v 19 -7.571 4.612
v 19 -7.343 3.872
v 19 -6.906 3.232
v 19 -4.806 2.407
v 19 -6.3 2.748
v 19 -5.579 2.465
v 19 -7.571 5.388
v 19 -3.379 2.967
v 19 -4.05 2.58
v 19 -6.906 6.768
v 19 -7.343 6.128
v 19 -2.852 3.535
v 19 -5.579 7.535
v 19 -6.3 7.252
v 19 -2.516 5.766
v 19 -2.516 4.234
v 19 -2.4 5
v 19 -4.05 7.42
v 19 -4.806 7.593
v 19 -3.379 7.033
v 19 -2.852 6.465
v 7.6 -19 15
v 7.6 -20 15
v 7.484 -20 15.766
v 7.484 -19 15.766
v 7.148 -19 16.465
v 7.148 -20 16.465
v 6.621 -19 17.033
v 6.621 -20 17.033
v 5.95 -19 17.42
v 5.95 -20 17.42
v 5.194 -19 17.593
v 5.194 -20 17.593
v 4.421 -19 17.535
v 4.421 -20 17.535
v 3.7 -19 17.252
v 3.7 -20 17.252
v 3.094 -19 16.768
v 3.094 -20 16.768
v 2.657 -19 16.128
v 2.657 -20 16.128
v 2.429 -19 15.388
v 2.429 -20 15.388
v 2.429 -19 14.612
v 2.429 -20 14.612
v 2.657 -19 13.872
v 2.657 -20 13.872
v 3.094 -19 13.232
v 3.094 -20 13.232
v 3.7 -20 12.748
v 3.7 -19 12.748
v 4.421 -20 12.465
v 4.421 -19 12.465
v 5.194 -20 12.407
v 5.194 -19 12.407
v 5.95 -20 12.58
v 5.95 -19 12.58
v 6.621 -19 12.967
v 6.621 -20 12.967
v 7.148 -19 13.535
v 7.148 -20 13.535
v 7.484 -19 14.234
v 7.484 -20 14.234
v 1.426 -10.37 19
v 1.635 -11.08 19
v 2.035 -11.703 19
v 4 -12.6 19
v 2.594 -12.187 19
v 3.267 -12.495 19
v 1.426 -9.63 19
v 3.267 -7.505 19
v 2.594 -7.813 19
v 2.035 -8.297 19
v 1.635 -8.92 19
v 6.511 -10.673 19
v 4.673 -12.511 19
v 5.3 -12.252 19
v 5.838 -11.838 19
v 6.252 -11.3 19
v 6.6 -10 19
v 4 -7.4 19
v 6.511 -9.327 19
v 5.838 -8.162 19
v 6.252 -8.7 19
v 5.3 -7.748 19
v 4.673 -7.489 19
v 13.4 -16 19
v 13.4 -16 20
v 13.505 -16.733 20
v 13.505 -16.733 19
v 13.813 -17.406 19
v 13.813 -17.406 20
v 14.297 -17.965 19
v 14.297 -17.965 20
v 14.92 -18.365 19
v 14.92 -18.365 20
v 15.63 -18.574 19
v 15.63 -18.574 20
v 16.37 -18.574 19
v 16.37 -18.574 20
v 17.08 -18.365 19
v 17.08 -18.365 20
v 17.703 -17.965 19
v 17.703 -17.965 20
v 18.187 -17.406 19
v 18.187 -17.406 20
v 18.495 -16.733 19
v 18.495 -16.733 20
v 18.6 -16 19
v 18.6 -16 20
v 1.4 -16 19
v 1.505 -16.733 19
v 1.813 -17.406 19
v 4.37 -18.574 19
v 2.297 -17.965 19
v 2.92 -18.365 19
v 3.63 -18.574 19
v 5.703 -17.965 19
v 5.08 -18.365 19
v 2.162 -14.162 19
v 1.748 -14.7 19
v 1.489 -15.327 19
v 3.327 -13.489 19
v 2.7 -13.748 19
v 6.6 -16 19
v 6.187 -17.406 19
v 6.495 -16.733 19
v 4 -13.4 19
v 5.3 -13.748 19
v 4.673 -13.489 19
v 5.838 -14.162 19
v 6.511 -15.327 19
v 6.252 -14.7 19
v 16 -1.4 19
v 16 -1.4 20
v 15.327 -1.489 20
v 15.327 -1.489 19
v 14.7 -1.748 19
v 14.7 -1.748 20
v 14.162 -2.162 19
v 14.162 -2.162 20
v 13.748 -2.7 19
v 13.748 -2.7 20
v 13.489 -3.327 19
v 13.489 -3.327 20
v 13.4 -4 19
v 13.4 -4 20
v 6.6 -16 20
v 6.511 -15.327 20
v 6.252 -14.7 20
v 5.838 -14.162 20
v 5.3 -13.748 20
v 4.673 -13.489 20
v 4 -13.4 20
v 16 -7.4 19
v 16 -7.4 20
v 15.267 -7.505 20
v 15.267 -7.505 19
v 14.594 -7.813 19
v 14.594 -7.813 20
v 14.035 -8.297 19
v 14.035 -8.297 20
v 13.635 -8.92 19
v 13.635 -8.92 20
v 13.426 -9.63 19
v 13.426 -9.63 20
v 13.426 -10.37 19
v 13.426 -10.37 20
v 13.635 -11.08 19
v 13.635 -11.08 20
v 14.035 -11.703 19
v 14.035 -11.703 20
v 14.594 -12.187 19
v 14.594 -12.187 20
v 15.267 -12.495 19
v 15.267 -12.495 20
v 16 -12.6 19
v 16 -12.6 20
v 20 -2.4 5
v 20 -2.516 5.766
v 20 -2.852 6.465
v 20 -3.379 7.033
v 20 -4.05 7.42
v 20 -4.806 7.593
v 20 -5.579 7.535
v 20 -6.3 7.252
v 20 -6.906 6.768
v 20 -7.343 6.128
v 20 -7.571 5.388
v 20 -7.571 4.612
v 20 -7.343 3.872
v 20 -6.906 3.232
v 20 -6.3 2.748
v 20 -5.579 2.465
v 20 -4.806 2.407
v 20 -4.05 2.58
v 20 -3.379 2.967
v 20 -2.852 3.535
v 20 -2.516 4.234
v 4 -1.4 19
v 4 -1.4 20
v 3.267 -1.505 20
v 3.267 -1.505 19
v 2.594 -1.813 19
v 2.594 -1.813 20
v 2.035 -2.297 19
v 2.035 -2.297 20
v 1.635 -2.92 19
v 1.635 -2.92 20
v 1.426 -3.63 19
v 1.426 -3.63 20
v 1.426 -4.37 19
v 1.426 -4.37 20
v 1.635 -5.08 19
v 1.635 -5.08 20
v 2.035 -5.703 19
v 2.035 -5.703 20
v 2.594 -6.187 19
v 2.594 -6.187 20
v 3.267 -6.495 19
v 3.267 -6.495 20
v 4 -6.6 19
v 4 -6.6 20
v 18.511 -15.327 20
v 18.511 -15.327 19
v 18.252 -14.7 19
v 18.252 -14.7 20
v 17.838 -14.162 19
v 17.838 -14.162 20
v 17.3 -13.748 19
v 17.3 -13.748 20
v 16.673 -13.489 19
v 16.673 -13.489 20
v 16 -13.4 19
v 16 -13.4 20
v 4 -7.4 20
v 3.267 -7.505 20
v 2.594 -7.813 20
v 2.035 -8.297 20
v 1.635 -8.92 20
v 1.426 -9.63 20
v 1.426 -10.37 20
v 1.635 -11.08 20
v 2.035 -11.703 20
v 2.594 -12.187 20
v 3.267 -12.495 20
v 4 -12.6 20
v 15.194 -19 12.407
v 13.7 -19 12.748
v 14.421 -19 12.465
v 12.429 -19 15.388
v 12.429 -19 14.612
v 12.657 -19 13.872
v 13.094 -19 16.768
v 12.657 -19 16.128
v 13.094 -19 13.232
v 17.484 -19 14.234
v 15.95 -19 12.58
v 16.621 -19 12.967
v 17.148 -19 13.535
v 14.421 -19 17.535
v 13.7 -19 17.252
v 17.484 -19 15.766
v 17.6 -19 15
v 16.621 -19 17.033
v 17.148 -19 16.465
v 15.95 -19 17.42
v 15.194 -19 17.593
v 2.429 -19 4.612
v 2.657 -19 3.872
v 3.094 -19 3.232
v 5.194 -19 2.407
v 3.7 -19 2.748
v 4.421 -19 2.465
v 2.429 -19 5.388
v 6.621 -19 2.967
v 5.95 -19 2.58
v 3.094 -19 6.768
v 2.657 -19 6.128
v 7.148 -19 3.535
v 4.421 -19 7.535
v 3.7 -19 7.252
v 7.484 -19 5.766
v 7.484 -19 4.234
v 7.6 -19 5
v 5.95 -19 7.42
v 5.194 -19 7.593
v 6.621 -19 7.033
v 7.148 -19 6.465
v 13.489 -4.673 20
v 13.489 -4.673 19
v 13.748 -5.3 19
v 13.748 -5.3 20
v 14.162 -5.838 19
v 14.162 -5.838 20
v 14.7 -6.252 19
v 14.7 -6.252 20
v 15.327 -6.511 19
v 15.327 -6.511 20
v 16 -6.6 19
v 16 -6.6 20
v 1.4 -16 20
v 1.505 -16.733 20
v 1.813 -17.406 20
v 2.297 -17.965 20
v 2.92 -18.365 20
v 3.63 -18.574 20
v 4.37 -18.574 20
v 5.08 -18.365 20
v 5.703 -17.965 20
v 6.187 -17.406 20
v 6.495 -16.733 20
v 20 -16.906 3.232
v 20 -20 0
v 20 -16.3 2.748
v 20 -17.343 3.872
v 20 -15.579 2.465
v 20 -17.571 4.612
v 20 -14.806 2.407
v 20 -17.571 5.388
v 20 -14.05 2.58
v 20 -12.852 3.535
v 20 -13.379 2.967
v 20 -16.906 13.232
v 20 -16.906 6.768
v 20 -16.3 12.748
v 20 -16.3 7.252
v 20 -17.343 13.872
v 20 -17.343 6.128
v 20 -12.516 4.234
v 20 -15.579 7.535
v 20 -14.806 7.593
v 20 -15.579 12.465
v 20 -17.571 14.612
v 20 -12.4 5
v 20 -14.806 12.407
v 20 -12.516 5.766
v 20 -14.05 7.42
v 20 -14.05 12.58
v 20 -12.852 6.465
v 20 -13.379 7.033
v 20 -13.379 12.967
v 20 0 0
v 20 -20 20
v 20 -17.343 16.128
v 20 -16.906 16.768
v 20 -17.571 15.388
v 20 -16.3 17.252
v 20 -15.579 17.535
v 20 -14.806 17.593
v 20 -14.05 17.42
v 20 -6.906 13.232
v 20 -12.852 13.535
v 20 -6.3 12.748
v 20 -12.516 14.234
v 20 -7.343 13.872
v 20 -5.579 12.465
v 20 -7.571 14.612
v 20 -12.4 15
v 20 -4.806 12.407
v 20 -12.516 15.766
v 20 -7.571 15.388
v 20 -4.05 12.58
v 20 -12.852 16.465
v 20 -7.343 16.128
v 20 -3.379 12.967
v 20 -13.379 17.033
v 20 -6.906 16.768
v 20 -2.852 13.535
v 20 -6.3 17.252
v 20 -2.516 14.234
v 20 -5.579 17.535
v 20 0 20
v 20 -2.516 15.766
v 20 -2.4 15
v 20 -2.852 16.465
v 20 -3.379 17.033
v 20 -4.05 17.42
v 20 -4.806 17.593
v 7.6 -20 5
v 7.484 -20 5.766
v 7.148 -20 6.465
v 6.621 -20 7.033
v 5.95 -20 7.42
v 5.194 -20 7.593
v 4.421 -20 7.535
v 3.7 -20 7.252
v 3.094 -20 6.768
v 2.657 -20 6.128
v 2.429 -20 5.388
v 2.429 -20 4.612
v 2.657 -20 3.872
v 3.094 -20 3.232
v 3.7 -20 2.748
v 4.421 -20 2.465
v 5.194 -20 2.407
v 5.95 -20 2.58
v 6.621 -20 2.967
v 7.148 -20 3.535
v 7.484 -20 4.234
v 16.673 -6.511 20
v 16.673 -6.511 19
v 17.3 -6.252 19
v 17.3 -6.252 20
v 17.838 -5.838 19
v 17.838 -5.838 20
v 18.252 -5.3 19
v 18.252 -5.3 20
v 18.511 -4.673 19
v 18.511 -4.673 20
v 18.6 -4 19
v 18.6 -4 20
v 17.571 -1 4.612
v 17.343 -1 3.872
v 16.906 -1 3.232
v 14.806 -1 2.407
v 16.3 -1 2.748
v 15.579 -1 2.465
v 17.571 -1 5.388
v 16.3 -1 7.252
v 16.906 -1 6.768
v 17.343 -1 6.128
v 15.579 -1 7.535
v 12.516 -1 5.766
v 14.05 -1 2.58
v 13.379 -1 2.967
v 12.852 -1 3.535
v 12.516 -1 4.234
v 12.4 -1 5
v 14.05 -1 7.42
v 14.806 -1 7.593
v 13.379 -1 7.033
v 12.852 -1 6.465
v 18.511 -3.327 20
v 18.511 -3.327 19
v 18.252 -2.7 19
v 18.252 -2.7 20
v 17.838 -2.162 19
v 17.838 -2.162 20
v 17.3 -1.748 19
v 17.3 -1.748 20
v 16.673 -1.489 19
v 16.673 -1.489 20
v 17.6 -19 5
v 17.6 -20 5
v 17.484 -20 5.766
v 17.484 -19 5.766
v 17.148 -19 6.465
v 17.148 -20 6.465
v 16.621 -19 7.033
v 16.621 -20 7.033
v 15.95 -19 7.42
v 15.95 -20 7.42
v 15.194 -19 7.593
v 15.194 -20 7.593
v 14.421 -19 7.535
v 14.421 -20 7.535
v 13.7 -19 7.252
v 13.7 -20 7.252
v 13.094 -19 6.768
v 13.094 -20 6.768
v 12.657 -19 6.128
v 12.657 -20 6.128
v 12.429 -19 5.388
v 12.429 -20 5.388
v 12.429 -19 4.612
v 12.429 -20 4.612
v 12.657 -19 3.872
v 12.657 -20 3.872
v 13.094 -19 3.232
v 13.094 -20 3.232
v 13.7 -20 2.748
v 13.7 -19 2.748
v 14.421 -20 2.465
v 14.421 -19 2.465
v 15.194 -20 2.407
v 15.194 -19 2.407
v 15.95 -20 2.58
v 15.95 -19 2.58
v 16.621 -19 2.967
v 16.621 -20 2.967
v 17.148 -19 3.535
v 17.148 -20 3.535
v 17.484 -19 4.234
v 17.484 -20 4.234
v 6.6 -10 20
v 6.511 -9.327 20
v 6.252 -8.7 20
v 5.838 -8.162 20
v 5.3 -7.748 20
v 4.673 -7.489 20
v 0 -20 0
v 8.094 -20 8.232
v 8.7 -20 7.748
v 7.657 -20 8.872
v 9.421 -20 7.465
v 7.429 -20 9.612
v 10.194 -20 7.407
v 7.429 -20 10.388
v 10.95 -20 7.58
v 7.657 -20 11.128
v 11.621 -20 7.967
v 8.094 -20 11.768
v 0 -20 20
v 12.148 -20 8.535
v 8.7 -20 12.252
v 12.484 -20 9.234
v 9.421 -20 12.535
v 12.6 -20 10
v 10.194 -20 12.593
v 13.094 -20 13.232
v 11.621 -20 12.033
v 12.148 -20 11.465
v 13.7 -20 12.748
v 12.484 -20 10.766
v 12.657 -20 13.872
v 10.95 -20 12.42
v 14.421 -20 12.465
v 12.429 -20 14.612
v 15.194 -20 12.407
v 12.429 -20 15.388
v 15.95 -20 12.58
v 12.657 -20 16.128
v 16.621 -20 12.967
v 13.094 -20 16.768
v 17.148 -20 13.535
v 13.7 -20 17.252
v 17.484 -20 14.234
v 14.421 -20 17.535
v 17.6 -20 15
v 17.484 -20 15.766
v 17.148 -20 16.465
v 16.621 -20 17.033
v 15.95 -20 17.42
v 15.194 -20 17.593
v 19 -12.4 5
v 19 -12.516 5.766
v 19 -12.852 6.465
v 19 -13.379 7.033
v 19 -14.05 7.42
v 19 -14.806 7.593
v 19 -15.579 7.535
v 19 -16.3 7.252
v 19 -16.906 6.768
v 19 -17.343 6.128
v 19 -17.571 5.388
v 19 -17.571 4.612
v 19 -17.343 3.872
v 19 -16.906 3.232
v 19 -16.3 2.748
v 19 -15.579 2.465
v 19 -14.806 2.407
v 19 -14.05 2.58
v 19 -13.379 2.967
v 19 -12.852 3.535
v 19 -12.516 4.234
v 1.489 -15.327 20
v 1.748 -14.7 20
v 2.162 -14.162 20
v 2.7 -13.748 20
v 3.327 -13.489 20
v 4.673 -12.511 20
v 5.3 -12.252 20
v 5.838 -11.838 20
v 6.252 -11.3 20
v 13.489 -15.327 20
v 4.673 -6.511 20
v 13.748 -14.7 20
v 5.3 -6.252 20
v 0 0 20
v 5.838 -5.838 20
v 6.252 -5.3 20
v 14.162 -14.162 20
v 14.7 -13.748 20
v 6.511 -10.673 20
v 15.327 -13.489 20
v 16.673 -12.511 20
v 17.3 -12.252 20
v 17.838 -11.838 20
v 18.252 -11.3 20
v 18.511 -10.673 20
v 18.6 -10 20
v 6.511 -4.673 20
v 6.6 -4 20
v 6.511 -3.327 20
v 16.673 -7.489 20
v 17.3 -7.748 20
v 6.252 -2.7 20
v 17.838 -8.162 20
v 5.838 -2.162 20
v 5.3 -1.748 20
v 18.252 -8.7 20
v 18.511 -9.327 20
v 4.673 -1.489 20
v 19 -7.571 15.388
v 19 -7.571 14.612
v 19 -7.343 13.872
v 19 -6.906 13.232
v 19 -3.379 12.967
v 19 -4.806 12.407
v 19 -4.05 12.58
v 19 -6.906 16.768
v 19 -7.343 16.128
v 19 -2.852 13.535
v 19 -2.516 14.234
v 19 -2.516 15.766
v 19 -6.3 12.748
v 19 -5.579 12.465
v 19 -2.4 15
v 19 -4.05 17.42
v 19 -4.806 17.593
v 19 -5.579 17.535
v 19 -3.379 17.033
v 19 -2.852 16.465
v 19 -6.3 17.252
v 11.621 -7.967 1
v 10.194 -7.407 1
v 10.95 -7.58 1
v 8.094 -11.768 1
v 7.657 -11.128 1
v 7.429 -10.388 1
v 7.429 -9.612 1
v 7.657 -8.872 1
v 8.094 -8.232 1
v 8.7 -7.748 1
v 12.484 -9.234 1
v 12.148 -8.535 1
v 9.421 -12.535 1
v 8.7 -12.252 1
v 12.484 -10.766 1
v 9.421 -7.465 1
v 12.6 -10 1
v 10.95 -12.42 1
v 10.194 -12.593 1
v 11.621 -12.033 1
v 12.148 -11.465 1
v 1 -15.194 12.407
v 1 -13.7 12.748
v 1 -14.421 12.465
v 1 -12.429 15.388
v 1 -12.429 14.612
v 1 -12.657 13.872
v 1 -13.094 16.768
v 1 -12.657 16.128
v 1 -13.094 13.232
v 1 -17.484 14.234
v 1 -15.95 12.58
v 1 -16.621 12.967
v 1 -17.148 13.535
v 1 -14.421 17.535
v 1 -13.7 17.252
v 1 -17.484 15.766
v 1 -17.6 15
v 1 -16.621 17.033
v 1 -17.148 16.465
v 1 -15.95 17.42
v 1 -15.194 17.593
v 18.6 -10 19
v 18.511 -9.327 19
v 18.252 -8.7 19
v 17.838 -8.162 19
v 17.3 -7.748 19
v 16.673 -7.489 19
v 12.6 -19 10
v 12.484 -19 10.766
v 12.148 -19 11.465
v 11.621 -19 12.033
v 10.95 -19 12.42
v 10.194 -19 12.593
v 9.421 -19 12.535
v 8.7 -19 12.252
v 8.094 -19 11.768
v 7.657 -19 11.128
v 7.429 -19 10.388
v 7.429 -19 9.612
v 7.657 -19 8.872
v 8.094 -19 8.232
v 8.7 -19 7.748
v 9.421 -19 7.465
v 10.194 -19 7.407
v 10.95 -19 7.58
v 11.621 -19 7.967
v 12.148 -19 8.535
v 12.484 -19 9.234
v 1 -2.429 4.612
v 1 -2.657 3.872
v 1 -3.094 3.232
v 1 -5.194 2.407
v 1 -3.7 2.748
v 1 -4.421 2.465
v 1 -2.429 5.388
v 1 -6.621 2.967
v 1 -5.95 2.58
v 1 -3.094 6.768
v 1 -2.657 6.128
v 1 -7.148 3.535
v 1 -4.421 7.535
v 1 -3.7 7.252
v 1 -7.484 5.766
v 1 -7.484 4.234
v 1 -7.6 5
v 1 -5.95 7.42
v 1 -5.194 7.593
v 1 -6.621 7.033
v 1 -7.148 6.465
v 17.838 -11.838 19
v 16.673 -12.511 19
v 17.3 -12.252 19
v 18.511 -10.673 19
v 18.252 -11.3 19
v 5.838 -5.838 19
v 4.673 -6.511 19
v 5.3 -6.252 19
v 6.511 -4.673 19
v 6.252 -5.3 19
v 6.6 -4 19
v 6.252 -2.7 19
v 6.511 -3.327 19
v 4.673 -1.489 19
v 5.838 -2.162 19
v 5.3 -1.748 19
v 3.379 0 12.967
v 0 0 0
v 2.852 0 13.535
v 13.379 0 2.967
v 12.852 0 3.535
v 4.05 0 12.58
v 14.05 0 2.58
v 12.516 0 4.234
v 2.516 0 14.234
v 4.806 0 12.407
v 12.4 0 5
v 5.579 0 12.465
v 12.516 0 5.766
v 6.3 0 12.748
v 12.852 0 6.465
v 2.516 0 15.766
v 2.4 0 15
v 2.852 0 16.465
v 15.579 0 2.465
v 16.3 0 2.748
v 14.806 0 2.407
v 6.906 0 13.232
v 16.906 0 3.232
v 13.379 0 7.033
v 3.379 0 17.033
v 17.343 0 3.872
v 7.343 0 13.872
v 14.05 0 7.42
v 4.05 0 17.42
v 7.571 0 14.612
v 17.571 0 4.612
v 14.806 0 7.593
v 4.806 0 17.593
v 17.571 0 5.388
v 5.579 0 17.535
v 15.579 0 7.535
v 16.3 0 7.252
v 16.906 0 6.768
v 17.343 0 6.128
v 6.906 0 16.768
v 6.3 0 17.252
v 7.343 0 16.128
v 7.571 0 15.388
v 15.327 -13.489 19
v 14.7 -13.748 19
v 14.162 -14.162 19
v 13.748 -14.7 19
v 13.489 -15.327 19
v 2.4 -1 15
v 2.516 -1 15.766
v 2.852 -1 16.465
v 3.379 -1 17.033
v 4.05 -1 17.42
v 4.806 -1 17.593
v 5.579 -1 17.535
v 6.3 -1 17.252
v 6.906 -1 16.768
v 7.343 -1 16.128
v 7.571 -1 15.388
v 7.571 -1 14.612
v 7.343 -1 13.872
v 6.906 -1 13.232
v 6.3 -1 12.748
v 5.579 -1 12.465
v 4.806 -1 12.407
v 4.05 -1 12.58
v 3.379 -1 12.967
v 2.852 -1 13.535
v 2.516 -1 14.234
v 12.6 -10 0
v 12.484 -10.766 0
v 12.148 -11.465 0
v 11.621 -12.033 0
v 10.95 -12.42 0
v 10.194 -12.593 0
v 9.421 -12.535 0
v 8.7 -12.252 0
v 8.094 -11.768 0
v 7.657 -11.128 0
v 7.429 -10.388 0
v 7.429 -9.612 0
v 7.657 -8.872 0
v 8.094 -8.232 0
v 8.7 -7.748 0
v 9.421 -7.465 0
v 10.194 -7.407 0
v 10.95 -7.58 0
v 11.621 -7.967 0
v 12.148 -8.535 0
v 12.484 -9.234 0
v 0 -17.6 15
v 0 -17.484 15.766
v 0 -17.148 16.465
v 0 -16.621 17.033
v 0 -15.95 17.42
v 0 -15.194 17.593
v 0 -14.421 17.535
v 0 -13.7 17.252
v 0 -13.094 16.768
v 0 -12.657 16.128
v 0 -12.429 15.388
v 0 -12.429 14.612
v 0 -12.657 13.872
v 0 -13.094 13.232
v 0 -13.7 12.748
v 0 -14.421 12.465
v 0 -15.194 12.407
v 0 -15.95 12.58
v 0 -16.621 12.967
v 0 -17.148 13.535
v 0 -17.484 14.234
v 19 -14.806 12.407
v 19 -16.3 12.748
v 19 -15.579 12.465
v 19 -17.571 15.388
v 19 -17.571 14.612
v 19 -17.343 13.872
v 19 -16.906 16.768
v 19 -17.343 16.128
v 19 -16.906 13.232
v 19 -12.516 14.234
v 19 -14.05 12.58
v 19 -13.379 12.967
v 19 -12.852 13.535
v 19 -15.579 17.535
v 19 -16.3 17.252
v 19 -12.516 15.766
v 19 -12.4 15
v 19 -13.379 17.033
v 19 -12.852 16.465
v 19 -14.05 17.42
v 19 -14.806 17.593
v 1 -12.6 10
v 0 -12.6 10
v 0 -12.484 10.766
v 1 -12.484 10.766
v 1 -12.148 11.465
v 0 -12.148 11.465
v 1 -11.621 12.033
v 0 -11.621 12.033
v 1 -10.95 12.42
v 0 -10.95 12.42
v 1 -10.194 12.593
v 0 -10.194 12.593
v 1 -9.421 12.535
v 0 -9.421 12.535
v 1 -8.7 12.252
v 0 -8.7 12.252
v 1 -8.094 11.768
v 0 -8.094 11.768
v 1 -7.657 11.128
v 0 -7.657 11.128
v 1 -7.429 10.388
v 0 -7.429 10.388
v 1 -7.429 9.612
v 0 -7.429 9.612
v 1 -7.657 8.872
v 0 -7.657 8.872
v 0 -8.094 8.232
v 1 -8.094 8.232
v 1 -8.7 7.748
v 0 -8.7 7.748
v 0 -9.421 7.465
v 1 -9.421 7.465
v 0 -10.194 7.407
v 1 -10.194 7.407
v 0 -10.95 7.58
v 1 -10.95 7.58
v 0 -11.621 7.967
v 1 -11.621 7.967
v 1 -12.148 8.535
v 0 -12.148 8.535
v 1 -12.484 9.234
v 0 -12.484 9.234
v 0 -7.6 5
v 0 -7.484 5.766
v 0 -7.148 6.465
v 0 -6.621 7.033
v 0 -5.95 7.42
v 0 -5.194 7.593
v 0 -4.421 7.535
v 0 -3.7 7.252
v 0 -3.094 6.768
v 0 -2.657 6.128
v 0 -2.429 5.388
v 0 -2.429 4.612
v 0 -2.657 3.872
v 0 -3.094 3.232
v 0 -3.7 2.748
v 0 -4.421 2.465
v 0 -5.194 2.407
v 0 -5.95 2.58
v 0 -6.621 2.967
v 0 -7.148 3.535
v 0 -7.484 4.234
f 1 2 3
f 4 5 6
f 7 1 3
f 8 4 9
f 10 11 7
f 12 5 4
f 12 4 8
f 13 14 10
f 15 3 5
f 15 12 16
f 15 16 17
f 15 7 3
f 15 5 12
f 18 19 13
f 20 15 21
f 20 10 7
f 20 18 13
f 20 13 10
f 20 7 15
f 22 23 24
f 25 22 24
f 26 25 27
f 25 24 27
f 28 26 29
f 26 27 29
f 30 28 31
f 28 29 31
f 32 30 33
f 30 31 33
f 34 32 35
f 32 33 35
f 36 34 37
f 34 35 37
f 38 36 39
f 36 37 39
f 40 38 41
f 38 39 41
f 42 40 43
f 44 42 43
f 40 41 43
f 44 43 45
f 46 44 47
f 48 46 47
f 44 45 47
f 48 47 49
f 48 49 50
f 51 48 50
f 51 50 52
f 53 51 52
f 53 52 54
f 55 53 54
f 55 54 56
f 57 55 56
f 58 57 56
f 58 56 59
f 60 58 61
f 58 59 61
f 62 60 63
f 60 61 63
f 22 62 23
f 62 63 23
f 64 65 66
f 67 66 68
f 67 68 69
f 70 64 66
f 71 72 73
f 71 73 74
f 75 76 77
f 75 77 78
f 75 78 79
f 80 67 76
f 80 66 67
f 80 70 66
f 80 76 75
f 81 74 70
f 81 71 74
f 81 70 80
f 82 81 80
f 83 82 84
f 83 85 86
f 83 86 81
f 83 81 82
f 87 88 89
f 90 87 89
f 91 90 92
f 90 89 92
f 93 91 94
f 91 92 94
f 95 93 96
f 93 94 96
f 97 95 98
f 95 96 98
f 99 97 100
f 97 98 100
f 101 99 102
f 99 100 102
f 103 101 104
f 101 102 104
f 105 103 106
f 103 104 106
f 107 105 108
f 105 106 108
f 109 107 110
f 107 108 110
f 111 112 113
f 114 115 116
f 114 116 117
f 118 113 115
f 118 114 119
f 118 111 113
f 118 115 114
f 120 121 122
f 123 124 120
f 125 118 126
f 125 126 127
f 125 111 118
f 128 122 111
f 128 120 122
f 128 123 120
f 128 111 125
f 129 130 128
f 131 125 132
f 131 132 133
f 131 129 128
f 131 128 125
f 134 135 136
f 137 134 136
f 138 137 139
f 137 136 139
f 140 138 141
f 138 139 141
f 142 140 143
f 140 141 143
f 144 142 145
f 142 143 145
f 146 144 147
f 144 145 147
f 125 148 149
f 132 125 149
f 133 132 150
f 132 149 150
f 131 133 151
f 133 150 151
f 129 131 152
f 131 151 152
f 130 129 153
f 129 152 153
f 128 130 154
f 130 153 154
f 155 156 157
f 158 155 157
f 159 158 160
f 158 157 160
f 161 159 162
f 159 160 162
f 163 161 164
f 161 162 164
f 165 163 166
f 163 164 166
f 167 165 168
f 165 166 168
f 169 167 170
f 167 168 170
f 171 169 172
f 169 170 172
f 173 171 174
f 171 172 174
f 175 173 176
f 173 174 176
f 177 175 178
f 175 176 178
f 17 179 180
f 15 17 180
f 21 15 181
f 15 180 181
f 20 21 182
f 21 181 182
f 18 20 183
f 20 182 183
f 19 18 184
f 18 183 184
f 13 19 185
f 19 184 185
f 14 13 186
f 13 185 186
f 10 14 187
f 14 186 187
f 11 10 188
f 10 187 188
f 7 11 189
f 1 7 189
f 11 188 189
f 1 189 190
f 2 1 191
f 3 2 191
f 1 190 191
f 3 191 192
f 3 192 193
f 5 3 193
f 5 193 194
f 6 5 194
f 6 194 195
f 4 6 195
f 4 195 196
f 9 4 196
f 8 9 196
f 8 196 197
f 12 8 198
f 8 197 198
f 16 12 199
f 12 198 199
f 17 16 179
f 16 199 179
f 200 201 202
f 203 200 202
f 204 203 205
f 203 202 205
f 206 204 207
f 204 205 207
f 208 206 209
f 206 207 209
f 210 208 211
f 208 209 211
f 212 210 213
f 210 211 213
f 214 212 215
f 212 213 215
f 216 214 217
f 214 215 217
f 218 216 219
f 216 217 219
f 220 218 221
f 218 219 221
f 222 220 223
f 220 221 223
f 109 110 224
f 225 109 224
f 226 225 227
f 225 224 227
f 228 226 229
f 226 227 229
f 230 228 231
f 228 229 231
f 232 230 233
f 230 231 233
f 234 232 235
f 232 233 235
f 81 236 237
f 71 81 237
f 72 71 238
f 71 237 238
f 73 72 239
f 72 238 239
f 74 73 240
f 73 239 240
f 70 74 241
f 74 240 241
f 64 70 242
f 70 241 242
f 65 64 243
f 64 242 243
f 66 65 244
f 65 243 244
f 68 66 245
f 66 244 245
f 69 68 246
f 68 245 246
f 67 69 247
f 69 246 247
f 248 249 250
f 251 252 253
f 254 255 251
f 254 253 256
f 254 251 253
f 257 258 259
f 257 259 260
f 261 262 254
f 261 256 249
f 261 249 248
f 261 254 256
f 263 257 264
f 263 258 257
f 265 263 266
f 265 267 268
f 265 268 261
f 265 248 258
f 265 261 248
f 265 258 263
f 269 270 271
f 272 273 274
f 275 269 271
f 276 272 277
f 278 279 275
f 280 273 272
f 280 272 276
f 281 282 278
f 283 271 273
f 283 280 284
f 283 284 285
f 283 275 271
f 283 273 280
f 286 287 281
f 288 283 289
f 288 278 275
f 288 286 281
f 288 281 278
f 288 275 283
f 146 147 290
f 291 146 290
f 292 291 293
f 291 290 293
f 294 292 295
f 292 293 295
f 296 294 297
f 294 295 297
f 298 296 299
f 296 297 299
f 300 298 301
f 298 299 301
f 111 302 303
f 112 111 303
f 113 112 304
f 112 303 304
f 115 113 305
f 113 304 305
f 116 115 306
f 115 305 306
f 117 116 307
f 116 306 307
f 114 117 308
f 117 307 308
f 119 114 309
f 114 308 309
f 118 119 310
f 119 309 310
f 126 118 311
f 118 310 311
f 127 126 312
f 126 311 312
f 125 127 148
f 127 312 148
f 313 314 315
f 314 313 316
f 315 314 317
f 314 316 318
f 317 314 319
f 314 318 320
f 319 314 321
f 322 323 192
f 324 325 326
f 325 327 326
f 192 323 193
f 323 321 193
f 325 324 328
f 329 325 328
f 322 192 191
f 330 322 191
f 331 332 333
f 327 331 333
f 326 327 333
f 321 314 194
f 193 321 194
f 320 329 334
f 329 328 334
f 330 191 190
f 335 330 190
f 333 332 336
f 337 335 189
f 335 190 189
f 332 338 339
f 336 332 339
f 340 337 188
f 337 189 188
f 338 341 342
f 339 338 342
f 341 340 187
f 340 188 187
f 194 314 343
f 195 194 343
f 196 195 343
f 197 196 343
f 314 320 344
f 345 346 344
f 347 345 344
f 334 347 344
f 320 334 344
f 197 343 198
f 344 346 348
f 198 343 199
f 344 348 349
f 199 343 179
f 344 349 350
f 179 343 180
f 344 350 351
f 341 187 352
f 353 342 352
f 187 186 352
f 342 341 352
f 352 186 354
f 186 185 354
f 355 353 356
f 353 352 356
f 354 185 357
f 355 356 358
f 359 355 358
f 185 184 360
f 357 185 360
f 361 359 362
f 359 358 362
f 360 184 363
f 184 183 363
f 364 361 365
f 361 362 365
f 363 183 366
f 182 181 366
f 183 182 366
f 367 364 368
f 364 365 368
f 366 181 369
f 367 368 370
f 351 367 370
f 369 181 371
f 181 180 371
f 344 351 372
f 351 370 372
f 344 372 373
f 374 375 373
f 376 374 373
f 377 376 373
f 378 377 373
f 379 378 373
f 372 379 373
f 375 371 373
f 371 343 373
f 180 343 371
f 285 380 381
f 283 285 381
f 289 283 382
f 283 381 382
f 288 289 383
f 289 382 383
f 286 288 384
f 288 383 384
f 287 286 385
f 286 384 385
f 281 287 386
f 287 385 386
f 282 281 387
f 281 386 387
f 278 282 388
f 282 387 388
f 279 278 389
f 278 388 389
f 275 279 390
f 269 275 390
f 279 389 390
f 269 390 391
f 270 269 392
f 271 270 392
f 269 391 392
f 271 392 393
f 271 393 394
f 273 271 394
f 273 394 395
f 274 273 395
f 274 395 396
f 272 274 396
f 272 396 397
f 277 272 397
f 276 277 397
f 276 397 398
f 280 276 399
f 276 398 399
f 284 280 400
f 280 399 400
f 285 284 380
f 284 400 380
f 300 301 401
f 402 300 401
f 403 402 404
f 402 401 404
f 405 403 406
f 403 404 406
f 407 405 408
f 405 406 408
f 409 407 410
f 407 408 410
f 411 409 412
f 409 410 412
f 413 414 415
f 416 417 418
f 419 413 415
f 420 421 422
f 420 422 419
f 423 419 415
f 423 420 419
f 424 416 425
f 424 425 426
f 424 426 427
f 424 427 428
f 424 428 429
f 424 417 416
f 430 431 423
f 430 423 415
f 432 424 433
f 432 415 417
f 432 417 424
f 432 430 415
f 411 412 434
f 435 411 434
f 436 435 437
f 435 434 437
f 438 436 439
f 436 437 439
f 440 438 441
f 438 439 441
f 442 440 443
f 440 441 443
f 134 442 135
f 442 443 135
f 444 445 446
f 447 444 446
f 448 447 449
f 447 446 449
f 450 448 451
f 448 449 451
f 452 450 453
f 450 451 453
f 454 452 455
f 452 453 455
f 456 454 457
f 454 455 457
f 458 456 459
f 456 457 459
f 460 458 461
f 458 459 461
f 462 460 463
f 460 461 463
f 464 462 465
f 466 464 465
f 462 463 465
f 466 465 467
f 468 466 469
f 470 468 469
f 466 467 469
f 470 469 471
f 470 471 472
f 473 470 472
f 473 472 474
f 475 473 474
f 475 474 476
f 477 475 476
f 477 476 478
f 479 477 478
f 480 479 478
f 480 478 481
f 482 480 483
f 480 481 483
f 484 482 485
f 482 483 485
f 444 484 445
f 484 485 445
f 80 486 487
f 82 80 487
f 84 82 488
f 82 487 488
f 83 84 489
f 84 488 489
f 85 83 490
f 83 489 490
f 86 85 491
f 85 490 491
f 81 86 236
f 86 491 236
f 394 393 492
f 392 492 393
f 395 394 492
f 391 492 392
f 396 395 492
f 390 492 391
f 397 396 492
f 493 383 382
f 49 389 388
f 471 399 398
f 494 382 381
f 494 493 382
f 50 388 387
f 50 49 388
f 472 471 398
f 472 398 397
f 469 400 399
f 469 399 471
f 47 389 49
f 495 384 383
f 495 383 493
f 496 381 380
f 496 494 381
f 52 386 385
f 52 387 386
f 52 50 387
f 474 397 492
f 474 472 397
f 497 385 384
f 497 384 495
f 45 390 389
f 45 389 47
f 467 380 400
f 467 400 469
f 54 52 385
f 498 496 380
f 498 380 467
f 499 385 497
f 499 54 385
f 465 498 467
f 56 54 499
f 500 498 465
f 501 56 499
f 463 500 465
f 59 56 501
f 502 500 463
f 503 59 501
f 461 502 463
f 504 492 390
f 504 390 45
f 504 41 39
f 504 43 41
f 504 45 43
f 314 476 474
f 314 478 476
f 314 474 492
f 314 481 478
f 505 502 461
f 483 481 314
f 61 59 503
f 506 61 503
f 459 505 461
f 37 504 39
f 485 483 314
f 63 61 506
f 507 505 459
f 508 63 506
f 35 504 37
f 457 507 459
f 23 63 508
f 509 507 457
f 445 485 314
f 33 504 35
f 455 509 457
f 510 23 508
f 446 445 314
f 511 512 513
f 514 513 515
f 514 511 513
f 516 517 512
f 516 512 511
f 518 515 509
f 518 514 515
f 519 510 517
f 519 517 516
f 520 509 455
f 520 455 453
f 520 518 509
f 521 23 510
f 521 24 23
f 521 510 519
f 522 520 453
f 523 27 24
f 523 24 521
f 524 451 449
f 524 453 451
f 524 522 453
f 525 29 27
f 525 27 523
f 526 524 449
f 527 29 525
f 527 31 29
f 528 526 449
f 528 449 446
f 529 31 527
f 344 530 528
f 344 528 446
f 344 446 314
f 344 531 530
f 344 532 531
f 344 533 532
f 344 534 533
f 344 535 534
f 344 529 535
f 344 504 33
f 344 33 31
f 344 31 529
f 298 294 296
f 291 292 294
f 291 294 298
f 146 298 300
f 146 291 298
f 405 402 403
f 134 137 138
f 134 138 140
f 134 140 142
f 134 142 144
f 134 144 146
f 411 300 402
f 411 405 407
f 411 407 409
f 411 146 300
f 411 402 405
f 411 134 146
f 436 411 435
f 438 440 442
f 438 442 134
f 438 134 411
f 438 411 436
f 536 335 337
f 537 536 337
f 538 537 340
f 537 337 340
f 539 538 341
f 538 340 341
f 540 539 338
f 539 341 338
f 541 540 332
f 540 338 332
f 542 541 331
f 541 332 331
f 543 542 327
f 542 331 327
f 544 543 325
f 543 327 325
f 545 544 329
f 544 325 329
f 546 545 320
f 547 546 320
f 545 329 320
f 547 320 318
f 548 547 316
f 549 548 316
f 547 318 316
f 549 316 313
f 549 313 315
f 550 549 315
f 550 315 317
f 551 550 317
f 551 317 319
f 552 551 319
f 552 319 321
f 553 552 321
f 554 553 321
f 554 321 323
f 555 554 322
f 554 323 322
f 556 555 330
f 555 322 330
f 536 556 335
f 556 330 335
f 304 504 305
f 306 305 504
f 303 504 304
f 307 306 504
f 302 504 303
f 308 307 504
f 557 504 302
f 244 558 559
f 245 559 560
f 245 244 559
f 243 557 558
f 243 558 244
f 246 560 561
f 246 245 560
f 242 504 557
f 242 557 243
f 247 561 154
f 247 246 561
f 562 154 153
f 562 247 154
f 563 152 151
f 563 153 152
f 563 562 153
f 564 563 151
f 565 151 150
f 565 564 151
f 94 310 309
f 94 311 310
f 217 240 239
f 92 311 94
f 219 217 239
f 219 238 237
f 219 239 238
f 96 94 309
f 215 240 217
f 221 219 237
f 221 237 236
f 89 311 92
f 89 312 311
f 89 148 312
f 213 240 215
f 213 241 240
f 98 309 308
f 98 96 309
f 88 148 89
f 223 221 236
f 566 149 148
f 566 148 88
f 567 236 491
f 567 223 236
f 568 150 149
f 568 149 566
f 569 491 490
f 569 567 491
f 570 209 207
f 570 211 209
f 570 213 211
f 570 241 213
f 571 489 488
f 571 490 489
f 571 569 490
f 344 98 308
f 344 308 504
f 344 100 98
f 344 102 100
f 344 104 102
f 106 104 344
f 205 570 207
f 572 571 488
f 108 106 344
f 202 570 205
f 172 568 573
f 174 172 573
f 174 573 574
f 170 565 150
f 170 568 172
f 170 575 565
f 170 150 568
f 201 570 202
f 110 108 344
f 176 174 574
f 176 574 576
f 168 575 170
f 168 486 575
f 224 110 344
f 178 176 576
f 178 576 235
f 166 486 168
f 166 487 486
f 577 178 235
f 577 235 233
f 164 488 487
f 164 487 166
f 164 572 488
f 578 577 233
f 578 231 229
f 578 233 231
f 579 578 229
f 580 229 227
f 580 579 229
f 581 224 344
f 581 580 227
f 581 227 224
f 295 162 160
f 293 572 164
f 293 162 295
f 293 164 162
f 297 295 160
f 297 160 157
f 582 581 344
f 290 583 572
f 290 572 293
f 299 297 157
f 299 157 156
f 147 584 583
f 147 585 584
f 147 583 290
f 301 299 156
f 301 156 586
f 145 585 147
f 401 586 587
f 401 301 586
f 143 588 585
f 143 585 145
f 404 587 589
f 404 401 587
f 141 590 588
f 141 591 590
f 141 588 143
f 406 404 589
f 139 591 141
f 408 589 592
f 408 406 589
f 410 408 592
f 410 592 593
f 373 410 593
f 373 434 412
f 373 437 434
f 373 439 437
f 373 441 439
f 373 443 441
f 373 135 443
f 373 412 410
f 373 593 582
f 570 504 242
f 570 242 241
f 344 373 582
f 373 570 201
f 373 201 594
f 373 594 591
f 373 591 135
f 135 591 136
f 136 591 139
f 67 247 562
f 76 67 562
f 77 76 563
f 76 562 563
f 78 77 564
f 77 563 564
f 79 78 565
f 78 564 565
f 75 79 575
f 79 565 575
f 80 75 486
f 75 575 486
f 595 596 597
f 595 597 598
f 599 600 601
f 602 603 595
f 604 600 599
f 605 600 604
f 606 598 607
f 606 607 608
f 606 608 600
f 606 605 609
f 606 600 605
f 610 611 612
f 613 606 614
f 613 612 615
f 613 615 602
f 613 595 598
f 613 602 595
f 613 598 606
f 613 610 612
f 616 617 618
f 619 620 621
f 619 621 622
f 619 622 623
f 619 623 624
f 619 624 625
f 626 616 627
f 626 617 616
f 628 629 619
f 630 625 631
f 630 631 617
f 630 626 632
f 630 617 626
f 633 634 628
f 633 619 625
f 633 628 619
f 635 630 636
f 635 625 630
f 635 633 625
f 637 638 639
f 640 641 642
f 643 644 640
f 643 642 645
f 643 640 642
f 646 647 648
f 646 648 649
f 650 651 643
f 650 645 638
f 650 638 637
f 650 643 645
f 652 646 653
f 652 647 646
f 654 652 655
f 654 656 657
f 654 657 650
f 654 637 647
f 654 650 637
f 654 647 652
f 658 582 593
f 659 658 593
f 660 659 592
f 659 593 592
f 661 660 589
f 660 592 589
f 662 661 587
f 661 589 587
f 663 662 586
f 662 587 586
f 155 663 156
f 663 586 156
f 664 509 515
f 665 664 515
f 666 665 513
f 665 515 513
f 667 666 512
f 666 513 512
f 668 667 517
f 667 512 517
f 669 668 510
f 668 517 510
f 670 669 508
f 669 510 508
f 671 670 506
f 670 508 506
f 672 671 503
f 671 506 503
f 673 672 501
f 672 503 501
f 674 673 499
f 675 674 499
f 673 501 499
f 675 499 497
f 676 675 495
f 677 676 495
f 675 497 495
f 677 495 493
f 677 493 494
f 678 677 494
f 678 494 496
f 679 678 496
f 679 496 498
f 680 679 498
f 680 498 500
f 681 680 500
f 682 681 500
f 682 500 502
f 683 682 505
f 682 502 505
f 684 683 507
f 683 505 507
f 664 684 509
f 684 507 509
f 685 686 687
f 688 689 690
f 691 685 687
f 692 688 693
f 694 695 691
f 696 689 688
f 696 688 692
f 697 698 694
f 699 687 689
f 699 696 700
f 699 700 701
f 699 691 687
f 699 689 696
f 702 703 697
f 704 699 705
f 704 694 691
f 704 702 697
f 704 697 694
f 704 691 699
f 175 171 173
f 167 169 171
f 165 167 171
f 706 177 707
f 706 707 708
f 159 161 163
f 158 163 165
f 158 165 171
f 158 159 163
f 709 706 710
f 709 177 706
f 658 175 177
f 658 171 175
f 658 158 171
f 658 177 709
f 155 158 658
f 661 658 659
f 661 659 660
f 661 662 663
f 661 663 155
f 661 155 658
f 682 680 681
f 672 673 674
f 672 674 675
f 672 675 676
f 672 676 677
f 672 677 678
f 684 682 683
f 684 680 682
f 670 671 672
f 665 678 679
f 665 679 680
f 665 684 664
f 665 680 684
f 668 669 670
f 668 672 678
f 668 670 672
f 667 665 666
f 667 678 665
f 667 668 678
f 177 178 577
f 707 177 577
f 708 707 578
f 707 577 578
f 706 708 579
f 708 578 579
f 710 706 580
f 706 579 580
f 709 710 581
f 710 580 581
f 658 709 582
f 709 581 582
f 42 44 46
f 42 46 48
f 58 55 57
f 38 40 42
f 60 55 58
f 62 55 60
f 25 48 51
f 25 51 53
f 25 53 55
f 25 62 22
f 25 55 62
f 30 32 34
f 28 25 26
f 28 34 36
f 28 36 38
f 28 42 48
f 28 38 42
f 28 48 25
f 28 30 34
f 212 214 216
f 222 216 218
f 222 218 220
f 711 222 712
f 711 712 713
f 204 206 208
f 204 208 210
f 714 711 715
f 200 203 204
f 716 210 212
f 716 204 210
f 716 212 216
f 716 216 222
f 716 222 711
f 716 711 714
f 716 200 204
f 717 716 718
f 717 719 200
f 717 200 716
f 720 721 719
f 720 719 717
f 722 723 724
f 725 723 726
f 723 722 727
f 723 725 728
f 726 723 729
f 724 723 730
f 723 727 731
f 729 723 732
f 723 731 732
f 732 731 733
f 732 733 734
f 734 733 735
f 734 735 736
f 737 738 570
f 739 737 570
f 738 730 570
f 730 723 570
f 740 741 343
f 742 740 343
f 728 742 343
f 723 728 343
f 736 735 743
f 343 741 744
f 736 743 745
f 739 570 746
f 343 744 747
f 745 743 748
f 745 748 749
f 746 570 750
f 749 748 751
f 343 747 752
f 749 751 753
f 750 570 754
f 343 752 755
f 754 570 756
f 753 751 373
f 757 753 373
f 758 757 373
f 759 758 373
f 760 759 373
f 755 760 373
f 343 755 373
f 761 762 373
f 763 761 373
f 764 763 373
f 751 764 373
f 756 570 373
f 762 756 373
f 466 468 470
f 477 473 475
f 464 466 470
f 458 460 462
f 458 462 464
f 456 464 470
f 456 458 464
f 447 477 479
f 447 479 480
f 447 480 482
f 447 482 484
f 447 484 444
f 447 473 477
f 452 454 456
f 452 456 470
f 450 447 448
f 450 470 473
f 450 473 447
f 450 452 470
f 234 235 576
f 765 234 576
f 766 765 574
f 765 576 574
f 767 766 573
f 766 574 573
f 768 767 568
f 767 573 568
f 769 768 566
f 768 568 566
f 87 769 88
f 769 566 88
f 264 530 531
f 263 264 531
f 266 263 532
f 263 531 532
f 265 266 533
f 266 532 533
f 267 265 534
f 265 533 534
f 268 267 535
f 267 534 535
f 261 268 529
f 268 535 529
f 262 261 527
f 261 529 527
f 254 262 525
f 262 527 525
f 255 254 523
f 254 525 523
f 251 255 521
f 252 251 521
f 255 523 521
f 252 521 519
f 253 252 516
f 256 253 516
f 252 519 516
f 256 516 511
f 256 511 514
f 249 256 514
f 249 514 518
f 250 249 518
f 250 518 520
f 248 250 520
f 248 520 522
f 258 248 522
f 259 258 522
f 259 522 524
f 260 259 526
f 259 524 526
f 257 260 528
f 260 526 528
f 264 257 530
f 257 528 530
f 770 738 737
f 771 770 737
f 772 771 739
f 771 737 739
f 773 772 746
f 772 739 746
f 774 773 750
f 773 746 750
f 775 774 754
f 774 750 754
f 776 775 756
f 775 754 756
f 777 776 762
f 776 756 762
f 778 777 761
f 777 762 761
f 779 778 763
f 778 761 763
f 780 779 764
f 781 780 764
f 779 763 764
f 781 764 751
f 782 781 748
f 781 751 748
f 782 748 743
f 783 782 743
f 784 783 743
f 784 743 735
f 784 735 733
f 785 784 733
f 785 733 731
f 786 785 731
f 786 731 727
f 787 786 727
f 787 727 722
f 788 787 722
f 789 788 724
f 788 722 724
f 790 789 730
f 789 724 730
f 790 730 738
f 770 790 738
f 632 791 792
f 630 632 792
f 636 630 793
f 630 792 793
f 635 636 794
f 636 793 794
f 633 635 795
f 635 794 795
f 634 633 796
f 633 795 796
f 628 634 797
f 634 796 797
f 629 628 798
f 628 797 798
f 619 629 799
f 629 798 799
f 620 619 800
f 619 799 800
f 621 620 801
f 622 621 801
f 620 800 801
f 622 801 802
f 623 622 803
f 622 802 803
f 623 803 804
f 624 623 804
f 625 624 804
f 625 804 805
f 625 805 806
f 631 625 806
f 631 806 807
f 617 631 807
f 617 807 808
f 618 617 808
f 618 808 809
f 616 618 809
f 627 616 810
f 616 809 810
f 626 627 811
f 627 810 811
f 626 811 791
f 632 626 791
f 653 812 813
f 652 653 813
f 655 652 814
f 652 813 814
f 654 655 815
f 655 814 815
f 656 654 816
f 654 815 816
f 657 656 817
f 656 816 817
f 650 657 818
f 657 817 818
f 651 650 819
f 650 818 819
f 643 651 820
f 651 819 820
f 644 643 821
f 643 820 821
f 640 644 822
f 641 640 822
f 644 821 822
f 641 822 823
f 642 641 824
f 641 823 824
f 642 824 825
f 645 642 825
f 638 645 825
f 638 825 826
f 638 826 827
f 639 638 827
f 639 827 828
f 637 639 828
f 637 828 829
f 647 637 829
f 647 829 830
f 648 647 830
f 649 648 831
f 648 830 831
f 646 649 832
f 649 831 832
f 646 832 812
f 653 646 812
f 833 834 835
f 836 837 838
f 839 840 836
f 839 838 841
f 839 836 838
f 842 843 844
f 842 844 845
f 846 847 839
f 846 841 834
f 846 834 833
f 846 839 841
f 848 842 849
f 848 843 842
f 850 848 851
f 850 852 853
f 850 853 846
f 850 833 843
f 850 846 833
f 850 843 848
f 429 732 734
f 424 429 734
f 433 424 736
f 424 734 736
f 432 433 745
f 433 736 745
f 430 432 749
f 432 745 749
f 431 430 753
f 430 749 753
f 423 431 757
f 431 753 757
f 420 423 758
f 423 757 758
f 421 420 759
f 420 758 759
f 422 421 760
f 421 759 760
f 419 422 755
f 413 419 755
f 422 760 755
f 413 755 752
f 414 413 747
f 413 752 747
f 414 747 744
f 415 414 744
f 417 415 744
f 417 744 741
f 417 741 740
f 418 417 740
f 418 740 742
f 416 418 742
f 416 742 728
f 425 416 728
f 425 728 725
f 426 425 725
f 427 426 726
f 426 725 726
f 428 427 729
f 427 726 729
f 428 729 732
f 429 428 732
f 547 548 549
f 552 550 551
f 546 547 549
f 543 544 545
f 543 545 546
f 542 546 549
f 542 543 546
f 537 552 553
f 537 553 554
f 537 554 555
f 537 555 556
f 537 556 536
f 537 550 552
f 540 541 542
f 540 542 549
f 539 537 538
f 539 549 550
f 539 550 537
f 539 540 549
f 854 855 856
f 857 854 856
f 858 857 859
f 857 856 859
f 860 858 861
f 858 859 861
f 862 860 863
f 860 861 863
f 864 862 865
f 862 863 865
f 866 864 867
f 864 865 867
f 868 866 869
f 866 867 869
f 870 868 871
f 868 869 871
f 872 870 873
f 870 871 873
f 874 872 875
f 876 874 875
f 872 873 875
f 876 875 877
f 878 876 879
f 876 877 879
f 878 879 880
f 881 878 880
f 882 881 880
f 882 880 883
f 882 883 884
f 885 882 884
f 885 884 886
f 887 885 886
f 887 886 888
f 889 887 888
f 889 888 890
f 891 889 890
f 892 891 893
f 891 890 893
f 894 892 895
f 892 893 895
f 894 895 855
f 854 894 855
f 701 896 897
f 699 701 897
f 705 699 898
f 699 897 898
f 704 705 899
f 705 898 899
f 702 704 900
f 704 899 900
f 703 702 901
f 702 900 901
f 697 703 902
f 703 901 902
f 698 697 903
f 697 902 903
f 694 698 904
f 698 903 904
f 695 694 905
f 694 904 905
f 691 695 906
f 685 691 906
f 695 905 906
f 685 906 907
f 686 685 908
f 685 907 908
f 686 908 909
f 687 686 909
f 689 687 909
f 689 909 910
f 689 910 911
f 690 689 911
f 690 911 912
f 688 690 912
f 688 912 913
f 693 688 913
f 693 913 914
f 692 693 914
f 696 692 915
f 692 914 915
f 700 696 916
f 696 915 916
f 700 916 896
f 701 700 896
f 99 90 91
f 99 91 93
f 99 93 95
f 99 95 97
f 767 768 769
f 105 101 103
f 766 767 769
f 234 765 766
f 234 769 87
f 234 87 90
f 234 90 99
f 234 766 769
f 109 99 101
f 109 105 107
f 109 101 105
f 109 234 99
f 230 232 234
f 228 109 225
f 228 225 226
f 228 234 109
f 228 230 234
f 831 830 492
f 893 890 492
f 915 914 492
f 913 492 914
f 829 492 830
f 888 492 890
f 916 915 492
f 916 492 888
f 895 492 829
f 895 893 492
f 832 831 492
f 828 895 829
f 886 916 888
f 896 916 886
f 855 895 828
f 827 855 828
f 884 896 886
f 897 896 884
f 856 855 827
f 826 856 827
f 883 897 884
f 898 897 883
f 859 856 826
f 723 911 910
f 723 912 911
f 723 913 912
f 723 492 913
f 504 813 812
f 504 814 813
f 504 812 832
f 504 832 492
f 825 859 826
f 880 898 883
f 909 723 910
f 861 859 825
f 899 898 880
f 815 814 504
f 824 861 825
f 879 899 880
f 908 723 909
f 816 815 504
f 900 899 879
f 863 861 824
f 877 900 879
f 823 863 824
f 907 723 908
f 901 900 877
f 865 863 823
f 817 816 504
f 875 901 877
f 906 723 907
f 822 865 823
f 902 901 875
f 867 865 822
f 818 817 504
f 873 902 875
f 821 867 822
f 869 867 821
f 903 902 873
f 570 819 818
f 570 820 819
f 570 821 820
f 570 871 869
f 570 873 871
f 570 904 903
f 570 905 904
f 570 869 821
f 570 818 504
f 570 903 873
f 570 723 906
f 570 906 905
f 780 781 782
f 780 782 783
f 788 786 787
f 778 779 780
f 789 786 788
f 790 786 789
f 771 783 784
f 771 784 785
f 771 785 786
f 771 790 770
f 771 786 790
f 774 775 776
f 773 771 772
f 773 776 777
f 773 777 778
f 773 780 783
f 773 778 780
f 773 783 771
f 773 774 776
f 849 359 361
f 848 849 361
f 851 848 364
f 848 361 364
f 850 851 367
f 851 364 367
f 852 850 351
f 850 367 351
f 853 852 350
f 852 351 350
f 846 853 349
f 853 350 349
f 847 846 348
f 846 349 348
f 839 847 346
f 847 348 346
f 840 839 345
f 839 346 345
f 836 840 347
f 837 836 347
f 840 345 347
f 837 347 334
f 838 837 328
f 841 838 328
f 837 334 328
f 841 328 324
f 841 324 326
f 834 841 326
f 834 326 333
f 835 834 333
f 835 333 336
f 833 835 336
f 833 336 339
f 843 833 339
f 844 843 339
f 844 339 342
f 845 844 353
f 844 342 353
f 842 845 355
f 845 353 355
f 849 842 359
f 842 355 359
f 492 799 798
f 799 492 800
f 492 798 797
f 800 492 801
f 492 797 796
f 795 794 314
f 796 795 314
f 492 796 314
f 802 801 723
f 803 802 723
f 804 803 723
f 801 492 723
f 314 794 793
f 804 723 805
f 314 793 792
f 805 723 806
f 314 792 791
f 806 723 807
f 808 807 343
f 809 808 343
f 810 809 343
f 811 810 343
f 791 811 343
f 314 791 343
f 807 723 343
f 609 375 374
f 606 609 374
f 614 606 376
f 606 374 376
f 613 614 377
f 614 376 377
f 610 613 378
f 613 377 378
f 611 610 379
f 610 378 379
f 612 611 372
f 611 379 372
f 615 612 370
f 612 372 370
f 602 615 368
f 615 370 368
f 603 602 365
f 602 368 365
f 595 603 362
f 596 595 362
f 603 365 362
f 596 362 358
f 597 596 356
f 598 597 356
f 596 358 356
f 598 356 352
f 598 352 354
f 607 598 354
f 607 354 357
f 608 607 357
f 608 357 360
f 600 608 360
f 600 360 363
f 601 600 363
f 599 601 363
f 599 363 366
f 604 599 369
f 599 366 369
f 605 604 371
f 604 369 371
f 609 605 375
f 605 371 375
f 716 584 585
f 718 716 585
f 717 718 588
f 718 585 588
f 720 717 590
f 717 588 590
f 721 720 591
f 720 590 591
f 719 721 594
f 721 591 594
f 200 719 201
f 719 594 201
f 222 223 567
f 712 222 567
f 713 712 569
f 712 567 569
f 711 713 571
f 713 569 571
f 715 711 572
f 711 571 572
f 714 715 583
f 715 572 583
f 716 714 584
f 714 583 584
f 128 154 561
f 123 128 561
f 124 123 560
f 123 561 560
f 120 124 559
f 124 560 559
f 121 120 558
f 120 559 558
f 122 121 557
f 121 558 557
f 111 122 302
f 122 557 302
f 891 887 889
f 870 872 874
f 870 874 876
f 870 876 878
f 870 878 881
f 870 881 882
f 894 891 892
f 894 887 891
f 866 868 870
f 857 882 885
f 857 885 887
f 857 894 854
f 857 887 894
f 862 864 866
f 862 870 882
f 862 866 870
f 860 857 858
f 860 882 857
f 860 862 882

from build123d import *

# Parameters (mm, degrees)
F0_W      = 20
F0_H      = 20
F1_DEPTH  = 20
F2_R      = 2.6
F3_DEPTH  = 1
F4_R      = 2.6
F5_DEPTH  = 1
F6_R      = 2.6
F7_DEPTH  = 1
F8_R      = 2.6
F9_DEPTH  = 1
F10_R     = 2.6
F11_DEPTH = 1
F13_DEPTH = 1


with BuildPart() as f1:
    # F0 (on Front) → F1 (new body)
    with BuildSketch(Plane.XZ):
        with Locations((10, 10)):
            Rectangle(F0_W, F0_H)
    extrude(amount=F1_DEPTH)

    # F2 (on face) → F3 (cut)
    with BuildSketch(Plane.XZ.offset(20)):
        with Locations((10, 10)):
            Circle(F2_R)
        with Locations((5, 15)):
            Circle(F2_R)
        with Locations((15, 15)):
            Circle(F2_R)
        with Locations((15, 5)):
            Circle(F2_R)
        with Locations((5, 5)):
            Circle(F2_R)
    extrude(amount=-F3_DEPTH, mode=Mode.SUBTRACT)

    # F4 (on face) → F5 (cut)
    with BuildSketch(Plane(origin=(0, 0, 0), x_dir=(-1, 0, 0), z_dir=(0, 1, 0))):
        with Locations((-5, 15)):
            Circle(F4_R)
        with Locations((-15, 5)):
            Circle(F4_R)
    extrude(amount=-F5_DEPTH, mode=Mode.SUBTRACT)

    # F6 (on face) → F7 (cut)
    with BuildSketch(Plane(origin=(0, 0, 0), x_dir=(0, -1, 0), z_dir=(-1, 0, 0))):
        with Locations((10, 10)):
            Circle(F6_R)
        with Locations((15, 15)):
            Circle(F6_R)
        with Locations((5, 5)):
            Circle(F6_R)
    extrude(amount=-F7_DEPTH, mode=Mode.SUBTRACT)

    # F8 (on face) → F9 (cut)
    with BuildSketch(Plane.YZ.offset(20)):
        with Locations((-15, 5)):
            Circle(F8_R)
        with Locations((-15, 15)):
            Circle(F8_R)
        with Locations((-5, 15)):
            Circle(F8_R)
        with Locations((-5, 5)):
            Circle(F8_R)
    extrude(amount=-F9_DEPTH, mode=Mode.SUBTRACT)

    # F10 (on face) → F11 (cut)
    with BuildSketch(Plane(origin=(0, 0, 0), x_dir=(1, 0, 0), z_dir=(0, 0, -1))):
        with Locations((10, 10)):
            Circle(F10_R)
    extrude(amount=-F11_DEPTH, mode=Mode.SUBTRACT)

    # F12 (on face) → F13 (cut)
    with BuildSketch(Plane.XY.offset(20)):
        with BuildLine():
            ThreePointArc((4, -6.6), (5.838478, -5.838478), (6.6, -4))
            ThreePointArc((6.6, -4), (5.838478, -2.161522), (4, -1.4))
            ThreePointArc((4, -1.4), (1.4, -4), (4, -6.6))
        make_face()
        with BuildLine():
            ThreePointArc((6.6, -16), (5.838478, -14.161522), (4, -13.4))
            ThreePointArc((4, -13.4), (2.161522, -14.161522), (1.4, -16))
            ThreePointArc((1.4, -16), (4, -18.6), (6.6, -16))
        make_face()
        with BuildLine():
            ThreePointArc((6.6, -10), (5.838478, -8.161522), (4, -7.4))
            ThreePointArc((4, -7.4), (1.4, -10), (4, -12.6))
            ThreePointArc((4, -12.6), (5.838478, -11.838478), (6.6, -10))
        make_face()
        with BuildLine():
            Line((13.4, -16), (18.6, -16))
            ThreePointArc((18.6, -16), (17.838478, -14.161522), (16, -13.4))
            ThreePointArc((16, -13.4), (14.161522, -14.161522), (13.4, -16))
        make_face()
        with BuildLine():
            ThreePointArc((13.4, -4), (14.161522, -5.838478), (16, -6.6))
            ThreePointArc((16, -6.6), (17.838478, -5.838478), (18.6, -4))
            Line((18.6, -4), (13.4, -4))
        make_face()
        with BuildLine():
            ThreePointArc((16, -7.4), (13.4, -10), (16, -12.6))
            ThreePointArc((16, -12.6), (17.838478, -11.838478), (18.6, -10))
            ThreePointArc((18.6, -10), (17.838478, -8.161522), (16, -7.4))
        make_face()
        with BuildLine():
            ThreePointArc((13.4, -16), (16, -18.6), (18.6, -16))
            Line((18.6, -16), (13.4, -16))
        make_face()
        with BuildLine():
            ThreePointArc((16, -1.4), (14.161522, -2.161522), (13.4, -4))
            Line((13.4, -4), (18.6, -4))
            ThreePointArc((18.6, -4), (17.838478, -2.161522), (16, -1.4))
        make_face()
    extrude(amount=-F13_DEPTH, mode=Mode.SUBTRACT)


solid = f1.part
